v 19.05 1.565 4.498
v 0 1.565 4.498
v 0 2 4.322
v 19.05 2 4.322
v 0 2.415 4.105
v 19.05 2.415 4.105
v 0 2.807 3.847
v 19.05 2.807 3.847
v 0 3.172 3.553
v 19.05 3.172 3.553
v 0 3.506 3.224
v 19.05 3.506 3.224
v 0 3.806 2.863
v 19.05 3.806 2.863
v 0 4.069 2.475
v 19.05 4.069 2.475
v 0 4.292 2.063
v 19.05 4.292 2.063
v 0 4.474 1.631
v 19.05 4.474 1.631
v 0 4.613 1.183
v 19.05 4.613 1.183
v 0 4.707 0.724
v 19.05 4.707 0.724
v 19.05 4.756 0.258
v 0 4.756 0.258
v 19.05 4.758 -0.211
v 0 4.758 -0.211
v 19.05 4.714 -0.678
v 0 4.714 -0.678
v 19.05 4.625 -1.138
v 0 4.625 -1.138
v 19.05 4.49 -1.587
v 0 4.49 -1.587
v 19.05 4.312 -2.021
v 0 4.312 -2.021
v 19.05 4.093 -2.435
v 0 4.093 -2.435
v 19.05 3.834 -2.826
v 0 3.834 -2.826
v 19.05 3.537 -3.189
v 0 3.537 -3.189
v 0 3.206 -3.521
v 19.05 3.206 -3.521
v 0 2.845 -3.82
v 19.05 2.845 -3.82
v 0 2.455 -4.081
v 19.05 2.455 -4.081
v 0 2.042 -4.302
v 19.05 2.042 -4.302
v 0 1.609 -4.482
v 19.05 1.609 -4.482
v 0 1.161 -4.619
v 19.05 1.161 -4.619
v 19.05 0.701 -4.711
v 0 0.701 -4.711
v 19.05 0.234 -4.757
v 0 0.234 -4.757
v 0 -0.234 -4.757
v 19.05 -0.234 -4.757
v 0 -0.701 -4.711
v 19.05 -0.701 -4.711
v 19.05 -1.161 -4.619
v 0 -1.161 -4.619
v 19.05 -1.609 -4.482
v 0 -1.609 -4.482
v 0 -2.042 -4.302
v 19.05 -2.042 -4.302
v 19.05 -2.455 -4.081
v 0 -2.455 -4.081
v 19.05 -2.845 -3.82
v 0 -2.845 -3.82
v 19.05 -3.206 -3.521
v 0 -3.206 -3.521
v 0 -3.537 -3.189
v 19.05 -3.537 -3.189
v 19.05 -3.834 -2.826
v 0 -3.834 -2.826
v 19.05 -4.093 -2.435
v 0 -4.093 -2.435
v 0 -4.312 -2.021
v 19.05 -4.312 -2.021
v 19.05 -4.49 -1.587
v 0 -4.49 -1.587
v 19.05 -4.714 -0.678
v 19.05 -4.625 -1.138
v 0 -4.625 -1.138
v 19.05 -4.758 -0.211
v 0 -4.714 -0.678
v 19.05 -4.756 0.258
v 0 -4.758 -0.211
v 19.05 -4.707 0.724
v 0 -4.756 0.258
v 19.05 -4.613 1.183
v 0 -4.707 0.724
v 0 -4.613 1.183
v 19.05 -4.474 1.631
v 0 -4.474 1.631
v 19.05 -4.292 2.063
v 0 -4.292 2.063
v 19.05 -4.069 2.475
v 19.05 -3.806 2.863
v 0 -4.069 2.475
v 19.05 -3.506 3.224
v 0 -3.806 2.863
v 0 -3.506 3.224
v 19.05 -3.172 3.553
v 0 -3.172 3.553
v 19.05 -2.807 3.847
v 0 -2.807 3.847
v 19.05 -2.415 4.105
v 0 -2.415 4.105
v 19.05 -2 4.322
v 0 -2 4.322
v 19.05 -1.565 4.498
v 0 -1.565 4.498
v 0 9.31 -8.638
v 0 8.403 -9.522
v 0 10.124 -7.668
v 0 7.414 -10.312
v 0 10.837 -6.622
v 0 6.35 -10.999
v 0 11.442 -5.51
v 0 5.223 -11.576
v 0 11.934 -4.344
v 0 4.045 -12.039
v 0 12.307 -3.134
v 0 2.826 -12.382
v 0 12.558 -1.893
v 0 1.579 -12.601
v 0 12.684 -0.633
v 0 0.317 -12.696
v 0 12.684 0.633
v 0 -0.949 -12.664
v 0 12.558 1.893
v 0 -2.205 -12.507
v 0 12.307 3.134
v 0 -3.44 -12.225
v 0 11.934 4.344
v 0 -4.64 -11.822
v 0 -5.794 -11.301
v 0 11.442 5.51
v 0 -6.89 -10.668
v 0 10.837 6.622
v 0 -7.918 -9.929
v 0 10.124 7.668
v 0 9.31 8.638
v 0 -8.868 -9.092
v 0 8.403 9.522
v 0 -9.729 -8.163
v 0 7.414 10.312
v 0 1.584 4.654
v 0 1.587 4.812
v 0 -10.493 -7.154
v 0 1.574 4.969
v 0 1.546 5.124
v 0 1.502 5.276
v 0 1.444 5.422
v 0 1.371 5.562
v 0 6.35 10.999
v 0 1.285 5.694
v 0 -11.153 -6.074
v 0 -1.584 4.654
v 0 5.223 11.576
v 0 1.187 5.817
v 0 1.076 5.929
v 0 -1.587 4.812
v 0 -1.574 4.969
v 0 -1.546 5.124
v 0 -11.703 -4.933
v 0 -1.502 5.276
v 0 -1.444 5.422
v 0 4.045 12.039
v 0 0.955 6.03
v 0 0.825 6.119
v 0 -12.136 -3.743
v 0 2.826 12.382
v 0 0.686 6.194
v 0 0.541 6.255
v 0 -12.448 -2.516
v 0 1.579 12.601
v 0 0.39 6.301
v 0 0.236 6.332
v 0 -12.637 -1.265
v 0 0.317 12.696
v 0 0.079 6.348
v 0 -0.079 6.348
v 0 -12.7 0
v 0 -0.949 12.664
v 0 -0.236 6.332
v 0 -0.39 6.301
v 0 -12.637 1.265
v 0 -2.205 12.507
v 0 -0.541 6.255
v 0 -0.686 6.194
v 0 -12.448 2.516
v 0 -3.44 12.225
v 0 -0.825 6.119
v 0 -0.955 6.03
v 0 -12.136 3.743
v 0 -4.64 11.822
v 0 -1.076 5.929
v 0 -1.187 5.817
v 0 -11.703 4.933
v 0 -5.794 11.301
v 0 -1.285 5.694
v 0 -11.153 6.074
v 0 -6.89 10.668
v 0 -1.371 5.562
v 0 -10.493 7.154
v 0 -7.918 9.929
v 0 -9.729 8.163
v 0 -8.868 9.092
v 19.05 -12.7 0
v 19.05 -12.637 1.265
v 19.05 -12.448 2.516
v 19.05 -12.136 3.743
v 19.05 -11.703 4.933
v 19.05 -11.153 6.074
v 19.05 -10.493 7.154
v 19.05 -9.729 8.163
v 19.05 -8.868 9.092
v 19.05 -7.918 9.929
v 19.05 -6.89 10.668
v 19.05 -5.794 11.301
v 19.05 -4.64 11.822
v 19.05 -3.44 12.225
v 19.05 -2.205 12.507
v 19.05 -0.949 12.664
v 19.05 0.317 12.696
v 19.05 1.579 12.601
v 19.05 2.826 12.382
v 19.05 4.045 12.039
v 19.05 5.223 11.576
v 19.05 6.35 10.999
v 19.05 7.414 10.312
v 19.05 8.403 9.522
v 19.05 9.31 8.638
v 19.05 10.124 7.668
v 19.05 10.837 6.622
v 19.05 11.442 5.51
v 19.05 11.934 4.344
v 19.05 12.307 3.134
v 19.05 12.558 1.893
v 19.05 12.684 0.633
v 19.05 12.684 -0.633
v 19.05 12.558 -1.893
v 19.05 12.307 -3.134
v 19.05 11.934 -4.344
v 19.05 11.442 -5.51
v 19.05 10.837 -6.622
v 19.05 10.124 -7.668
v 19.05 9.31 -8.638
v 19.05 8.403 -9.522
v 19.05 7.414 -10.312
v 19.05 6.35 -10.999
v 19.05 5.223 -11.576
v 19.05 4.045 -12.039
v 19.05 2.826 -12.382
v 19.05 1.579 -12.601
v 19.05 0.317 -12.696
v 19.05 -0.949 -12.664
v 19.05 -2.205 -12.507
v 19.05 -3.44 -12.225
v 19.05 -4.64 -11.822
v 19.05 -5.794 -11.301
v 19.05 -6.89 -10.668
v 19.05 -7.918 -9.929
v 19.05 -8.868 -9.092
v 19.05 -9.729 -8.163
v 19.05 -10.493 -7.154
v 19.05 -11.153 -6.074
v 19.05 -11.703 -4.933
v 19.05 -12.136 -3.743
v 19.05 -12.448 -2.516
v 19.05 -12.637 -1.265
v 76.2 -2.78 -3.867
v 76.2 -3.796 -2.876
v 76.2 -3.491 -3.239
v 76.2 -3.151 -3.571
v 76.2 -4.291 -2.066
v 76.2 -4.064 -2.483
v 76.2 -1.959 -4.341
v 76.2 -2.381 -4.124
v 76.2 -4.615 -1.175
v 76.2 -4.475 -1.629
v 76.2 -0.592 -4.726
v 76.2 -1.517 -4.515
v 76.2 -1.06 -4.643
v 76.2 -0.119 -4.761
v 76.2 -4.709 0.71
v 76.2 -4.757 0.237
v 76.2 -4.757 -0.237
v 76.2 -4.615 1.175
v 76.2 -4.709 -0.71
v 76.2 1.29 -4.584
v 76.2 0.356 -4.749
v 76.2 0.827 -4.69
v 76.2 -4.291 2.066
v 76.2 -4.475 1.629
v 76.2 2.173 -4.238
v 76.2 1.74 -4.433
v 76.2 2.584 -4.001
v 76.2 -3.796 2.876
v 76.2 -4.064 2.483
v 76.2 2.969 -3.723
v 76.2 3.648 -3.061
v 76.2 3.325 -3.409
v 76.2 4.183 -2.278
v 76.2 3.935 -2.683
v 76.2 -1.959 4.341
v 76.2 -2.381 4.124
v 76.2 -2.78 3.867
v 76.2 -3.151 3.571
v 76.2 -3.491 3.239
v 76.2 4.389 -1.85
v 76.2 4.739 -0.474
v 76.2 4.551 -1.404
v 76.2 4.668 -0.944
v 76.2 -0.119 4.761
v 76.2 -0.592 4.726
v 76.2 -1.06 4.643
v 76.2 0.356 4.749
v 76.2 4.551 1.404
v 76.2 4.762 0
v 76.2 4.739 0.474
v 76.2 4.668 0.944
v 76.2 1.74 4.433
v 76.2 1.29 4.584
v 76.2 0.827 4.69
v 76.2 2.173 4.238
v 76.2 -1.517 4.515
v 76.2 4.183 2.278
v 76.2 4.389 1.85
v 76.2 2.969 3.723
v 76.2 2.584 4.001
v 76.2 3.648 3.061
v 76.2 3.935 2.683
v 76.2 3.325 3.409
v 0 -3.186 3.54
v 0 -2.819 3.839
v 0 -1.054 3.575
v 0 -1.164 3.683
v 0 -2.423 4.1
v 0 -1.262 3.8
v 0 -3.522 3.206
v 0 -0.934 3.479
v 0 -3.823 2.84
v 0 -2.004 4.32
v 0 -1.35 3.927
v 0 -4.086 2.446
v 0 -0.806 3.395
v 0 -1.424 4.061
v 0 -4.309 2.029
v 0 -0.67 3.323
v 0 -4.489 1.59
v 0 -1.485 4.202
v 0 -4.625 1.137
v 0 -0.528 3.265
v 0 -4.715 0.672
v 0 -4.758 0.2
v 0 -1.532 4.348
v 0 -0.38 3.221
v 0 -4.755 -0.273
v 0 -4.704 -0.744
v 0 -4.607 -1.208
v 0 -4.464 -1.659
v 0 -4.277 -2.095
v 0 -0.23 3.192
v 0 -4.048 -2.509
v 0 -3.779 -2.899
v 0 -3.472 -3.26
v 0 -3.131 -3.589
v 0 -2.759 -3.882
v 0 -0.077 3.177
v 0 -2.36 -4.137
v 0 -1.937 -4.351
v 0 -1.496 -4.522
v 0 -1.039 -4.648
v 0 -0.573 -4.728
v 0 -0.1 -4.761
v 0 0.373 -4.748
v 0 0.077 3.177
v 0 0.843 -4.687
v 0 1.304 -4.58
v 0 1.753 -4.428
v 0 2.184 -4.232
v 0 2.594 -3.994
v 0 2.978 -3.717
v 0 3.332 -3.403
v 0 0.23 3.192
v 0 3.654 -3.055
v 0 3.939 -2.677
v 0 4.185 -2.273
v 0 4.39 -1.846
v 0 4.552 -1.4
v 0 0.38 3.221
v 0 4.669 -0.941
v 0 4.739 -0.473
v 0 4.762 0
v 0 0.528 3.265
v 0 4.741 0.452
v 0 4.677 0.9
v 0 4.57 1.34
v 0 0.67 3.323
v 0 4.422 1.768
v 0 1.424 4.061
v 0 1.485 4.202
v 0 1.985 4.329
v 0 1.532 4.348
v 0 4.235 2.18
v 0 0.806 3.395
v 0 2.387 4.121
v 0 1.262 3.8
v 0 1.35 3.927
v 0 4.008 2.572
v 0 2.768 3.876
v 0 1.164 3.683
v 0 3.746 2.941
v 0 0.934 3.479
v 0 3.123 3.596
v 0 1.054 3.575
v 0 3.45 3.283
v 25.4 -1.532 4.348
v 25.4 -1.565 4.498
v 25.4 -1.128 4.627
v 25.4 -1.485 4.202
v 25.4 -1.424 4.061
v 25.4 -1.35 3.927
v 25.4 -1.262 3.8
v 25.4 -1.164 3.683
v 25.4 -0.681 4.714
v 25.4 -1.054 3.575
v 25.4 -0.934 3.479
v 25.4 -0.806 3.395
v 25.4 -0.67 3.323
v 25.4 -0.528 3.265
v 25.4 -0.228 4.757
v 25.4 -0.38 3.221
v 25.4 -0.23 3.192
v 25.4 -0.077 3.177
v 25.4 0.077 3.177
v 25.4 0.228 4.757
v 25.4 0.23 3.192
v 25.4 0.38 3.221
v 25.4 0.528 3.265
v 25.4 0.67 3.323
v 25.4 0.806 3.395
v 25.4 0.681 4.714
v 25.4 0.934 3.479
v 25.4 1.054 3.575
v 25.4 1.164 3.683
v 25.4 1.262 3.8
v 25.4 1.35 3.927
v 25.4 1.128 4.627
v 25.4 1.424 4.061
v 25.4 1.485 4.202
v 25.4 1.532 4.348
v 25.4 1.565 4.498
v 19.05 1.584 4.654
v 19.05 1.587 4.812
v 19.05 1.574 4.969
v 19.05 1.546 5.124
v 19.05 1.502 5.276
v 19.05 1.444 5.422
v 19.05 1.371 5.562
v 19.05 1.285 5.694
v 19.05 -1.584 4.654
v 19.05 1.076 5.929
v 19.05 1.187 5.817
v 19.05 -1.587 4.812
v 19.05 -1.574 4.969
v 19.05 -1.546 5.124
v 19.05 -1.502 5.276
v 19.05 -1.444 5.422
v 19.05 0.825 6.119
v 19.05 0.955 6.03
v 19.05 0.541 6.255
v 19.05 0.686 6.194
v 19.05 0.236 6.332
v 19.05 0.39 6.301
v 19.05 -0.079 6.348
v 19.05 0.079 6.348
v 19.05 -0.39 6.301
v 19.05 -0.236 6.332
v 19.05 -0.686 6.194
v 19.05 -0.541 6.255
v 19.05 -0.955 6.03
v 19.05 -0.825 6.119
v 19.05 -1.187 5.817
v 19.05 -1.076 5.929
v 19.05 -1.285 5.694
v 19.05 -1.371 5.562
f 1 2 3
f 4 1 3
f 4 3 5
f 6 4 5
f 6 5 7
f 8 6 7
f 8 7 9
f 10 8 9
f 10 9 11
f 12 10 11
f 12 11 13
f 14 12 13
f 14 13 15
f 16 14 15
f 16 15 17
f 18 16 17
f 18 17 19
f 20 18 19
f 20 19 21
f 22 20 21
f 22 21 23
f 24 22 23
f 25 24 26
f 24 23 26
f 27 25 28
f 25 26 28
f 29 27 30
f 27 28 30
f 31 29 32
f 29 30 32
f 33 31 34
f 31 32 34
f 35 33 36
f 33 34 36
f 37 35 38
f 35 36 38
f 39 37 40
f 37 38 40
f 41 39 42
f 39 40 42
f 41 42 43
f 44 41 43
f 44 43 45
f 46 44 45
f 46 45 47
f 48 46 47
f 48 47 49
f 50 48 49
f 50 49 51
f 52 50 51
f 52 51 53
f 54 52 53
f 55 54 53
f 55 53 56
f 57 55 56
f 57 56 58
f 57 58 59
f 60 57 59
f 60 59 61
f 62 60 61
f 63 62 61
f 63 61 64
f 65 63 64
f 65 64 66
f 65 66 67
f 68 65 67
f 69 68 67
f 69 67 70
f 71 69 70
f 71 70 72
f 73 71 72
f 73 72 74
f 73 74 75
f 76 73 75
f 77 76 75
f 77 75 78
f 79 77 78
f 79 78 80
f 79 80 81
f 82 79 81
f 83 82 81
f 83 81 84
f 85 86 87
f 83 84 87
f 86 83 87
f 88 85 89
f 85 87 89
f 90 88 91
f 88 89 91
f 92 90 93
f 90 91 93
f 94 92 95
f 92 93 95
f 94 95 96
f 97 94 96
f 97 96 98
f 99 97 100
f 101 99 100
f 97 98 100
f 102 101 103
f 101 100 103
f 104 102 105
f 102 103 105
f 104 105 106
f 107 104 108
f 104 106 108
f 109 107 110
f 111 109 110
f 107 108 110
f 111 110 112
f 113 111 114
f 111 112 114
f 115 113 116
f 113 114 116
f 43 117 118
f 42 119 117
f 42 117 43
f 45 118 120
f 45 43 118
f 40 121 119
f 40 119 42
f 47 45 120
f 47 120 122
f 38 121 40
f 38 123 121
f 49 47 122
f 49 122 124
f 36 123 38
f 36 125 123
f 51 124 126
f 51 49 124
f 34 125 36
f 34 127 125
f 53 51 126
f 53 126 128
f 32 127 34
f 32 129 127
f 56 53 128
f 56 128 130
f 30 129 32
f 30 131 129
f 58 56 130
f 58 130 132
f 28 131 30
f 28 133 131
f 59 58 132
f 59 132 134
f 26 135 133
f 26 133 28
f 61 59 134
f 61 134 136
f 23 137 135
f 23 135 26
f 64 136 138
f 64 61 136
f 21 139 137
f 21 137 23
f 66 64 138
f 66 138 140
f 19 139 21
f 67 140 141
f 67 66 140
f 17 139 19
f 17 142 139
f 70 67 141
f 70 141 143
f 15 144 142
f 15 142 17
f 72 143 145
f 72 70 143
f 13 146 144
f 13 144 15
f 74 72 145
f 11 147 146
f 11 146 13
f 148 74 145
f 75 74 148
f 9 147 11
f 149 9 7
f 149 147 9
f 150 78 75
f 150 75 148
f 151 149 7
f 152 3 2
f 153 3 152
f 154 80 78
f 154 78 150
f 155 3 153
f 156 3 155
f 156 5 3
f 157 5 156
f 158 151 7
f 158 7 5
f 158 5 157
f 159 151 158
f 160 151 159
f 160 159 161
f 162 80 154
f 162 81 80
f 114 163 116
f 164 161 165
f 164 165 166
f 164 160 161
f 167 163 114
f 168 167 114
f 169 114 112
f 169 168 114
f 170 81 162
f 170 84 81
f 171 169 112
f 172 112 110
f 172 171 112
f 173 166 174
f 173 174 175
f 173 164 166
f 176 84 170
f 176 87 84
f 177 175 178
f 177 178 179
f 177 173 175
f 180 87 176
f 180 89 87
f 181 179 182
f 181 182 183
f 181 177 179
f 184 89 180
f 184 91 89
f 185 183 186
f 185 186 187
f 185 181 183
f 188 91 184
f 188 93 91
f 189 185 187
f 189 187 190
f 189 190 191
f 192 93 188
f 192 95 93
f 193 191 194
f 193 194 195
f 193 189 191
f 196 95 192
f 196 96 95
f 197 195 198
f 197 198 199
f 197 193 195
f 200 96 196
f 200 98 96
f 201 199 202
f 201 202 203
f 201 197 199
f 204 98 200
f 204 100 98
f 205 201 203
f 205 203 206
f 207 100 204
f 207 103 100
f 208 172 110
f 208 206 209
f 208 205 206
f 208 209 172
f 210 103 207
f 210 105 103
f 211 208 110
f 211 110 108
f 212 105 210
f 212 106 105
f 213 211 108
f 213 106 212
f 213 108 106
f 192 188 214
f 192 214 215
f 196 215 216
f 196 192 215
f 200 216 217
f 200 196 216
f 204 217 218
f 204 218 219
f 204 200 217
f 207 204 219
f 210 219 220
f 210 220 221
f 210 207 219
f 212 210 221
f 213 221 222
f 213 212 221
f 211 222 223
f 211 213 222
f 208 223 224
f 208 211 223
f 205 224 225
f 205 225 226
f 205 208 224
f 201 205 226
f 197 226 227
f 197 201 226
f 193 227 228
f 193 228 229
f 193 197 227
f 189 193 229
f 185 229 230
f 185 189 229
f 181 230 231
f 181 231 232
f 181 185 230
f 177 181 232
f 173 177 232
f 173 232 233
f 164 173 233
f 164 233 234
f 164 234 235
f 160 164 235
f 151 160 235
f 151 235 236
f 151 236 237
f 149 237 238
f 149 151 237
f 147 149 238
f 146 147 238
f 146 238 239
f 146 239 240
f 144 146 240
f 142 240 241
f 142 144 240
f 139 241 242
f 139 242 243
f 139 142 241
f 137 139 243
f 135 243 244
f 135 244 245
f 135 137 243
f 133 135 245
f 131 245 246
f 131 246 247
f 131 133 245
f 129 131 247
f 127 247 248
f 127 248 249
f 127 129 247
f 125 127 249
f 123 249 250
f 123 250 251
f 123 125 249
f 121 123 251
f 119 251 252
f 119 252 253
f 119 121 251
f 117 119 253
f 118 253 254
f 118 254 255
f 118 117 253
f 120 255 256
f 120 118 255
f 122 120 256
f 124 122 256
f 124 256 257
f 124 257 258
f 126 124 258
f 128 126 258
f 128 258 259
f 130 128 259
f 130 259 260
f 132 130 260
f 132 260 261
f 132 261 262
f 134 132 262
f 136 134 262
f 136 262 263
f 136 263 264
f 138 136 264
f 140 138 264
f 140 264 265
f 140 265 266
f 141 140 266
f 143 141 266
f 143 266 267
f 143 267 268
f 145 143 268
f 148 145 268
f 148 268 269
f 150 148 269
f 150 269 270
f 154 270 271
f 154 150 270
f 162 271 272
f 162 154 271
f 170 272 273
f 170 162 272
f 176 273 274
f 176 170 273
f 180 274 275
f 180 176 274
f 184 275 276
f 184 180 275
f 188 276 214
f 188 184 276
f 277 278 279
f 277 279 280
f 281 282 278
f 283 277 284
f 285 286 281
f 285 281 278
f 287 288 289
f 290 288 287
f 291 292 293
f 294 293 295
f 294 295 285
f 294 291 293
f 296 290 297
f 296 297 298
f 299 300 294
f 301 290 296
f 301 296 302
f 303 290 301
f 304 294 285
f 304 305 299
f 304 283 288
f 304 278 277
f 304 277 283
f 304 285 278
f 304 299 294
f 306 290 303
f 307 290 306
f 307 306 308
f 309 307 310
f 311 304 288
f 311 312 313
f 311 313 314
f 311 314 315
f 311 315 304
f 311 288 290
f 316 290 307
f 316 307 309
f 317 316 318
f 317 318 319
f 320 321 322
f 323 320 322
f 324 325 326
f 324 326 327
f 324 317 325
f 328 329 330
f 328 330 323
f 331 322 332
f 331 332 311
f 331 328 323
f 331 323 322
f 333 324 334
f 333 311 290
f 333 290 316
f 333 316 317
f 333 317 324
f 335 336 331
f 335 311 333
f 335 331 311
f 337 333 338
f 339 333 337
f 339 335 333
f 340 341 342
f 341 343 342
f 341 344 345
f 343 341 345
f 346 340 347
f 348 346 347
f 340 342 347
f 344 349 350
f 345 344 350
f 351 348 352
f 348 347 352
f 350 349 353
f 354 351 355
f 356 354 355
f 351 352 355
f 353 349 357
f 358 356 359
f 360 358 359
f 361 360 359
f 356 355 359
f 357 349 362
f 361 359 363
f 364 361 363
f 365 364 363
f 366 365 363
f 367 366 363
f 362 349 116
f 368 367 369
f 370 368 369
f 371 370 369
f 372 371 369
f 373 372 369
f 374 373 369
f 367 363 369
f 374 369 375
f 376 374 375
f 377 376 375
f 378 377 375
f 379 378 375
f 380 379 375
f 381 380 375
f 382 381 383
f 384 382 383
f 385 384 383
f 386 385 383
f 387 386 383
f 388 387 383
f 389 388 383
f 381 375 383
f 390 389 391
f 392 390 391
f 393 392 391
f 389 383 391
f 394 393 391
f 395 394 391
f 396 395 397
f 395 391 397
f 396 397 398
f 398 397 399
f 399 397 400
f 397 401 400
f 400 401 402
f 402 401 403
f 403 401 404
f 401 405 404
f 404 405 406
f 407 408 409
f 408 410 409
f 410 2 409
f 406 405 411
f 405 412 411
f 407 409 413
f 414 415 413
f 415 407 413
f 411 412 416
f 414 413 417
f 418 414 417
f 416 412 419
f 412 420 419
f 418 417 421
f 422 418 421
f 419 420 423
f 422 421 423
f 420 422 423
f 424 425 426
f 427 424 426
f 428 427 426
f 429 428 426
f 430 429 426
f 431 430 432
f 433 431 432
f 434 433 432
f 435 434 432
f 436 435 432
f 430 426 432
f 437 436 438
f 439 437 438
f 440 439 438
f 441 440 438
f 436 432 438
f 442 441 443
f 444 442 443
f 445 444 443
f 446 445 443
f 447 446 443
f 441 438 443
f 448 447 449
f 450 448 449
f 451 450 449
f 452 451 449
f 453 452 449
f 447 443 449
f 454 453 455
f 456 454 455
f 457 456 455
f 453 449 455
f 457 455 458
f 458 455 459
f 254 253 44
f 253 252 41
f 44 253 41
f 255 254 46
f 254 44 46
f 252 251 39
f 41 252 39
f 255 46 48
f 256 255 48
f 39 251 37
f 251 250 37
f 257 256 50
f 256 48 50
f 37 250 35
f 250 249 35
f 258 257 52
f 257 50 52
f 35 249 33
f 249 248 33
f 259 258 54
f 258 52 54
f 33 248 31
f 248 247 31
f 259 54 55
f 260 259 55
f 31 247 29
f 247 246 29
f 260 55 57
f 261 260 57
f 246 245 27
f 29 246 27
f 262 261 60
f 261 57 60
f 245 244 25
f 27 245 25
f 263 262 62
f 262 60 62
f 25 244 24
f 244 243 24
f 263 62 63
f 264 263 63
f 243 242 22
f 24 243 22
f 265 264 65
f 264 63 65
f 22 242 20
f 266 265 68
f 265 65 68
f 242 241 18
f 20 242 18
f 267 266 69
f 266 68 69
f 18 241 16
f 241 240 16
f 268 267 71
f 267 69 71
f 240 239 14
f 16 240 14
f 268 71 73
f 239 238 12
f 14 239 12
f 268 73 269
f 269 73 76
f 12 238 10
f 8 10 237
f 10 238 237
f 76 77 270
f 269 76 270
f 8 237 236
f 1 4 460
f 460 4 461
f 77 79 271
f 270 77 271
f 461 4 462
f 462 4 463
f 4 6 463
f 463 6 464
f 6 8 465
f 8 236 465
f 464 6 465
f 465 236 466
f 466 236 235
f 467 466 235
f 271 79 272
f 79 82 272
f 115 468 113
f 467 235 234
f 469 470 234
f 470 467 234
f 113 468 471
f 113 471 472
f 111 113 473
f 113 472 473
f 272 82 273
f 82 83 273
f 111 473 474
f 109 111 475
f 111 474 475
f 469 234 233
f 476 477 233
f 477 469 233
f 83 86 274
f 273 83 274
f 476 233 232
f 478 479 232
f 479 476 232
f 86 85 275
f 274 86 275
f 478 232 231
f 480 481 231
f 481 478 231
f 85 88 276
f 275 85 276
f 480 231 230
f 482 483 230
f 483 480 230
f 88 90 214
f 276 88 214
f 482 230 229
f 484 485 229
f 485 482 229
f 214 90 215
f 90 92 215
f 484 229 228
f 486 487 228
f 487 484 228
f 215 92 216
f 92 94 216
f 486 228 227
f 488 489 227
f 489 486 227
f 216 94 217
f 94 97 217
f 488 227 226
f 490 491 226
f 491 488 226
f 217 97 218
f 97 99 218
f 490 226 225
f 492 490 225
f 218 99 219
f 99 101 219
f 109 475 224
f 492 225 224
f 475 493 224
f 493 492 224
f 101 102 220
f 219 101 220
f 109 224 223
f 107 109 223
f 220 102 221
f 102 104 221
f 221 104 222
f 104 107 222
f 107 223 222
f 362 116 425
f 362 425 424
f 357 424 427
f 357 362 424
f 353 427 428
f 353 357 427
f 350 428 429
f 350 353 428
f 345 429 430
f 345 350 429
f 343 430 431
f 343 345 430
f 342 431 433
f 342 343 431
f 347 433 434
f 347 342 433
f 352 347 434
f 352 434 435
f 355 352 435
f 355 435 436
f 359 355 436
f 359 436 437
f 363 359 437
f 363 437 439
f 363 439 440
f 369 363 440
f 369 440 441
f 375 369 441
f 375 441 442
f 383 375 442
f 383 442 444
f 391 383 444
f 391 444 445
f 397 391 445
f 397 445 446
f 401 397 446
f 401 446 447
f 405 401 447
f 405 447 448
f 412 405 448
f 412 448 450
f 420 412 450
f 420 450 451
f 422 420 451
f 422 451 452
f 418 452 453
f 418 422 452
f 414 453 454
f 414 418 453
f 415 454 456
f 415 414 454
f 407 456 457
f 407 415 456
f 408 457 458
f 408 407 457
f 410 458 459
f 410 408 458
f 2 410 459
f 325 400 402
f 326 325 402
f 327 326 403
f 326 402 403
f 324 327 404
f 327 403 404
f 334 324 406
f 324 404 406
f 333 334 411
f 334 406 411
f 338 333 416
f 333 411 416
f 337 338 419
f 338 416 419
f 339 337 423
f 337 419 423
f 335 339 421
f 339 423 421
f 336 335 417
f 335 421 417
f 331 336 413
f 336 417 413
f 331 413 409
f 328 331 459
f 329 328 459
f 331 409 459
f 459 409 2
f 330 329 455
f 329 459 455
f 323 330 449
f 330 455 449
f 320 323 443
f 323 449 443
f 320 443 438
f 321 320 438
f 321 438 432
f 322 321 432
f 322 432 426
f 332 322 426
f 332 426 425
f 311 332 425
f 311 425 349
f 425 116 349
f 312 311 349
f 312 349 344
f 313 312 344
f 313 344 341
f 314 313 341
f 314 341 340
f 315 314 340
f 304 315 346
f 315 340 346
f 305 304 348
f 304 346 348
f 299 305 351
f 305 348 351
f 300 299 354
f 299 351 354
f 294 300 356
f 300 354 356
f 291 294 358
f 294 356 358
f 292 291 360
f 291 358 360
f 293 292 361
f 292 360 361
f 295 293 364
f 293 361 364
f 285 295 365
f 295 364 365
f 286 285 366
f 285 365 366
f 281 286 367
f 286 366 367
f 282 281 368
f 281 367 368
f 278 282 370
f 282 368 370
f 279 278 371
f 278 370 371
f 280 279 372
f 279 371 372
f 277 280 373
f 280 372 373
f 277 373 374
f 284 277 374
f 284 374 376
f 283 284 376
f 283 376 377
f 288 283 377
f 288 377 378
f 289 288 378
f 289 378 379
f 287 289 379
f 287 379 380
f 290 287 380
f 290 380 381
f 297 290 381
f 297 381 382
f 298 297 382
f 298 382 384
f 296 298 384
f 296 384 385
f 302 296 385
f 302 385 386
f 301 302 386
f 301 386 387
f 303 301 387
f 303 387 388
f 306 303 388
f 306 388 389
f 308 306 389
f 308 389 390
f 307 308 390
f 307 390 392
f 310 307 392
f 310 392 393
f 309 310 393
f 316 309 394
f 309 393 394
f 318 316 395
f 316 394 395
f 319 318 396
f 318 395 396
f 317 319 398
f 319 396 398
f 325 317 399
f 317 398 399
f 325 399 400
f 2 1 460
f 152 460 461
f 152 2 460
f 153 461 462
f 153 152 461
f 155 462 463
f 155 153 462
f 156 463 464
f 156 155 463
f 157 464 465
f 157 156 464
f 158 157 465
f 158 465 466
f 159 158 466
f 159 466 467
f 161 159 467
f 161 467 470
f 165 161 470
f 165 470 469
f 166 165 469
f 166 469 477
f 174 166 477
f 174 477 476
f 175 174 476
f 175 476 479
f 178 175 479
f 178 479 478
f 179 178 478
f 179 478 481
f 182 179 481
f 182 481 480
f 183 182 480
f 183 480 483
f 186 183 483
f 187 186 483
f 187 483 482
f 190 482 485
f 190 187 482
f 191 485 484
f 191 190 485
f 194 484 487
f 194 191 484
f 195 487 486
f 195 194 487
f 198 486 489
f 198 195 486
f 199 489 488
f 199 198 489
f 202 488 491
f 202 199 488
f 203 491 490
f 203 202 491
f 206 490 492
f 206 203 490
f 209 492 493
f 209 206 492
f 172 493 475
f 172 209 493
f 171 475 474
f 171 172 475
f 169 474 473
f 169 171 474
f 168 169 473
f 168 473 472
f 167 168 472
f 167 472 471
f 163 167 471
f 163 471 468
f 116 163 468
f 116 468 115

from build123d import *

# Parameters (mm, degrees)
F0_R     = 4.7625
F1_DEPTH = 76.2
F3_R     = 12.7
F3_R_2   = 4.7625
F4_DEPTH = 19.05
F2_R     = 1.5875
F5_DEPTH = 25.4


with BuildPart() as f1:
    # F0 (on Right) → F1 (new body)
    with BuildSketch(Plane.YZ):
        Circle(F0_R)
    extrude(amount=F1_DEPTH)


with BuildPart() as f4:
    # F3 (on face) → F4 (new body)
    with BuildSketch(Plane(origin=(0, 0, 0), x_dir=(0, -1, 0), z_dir=(-1, 0, 0))):
        Circle(F3_R)
        Circle(F3_R_2, mode=Mode.SUBTRACT)
    extrude(amount=-F4_DEPTH)


with BuildPart() as f5_tool:
    # F2 (on Right) → F5 (new body)
    with BuildSketch(Plane.YZ):
        with Locations((0, 4.7625)):
            Circle(F2_R)
    extrude(amount=F5_DEPTH)


with BuildPart() as f1_1:
    add(f1.part)

    # F5: cut by f5_tool
    add(f5_tool.part, mode=Mode.SUBTRACT)


with BuildPart() as f4_1:
    add(f4.part)

    # F5: cut by f5_tool
    add(f5_tool.part, mode=Mode.SUBTRACT)


solid = Compound([f1_1.part, f4_1.part])
